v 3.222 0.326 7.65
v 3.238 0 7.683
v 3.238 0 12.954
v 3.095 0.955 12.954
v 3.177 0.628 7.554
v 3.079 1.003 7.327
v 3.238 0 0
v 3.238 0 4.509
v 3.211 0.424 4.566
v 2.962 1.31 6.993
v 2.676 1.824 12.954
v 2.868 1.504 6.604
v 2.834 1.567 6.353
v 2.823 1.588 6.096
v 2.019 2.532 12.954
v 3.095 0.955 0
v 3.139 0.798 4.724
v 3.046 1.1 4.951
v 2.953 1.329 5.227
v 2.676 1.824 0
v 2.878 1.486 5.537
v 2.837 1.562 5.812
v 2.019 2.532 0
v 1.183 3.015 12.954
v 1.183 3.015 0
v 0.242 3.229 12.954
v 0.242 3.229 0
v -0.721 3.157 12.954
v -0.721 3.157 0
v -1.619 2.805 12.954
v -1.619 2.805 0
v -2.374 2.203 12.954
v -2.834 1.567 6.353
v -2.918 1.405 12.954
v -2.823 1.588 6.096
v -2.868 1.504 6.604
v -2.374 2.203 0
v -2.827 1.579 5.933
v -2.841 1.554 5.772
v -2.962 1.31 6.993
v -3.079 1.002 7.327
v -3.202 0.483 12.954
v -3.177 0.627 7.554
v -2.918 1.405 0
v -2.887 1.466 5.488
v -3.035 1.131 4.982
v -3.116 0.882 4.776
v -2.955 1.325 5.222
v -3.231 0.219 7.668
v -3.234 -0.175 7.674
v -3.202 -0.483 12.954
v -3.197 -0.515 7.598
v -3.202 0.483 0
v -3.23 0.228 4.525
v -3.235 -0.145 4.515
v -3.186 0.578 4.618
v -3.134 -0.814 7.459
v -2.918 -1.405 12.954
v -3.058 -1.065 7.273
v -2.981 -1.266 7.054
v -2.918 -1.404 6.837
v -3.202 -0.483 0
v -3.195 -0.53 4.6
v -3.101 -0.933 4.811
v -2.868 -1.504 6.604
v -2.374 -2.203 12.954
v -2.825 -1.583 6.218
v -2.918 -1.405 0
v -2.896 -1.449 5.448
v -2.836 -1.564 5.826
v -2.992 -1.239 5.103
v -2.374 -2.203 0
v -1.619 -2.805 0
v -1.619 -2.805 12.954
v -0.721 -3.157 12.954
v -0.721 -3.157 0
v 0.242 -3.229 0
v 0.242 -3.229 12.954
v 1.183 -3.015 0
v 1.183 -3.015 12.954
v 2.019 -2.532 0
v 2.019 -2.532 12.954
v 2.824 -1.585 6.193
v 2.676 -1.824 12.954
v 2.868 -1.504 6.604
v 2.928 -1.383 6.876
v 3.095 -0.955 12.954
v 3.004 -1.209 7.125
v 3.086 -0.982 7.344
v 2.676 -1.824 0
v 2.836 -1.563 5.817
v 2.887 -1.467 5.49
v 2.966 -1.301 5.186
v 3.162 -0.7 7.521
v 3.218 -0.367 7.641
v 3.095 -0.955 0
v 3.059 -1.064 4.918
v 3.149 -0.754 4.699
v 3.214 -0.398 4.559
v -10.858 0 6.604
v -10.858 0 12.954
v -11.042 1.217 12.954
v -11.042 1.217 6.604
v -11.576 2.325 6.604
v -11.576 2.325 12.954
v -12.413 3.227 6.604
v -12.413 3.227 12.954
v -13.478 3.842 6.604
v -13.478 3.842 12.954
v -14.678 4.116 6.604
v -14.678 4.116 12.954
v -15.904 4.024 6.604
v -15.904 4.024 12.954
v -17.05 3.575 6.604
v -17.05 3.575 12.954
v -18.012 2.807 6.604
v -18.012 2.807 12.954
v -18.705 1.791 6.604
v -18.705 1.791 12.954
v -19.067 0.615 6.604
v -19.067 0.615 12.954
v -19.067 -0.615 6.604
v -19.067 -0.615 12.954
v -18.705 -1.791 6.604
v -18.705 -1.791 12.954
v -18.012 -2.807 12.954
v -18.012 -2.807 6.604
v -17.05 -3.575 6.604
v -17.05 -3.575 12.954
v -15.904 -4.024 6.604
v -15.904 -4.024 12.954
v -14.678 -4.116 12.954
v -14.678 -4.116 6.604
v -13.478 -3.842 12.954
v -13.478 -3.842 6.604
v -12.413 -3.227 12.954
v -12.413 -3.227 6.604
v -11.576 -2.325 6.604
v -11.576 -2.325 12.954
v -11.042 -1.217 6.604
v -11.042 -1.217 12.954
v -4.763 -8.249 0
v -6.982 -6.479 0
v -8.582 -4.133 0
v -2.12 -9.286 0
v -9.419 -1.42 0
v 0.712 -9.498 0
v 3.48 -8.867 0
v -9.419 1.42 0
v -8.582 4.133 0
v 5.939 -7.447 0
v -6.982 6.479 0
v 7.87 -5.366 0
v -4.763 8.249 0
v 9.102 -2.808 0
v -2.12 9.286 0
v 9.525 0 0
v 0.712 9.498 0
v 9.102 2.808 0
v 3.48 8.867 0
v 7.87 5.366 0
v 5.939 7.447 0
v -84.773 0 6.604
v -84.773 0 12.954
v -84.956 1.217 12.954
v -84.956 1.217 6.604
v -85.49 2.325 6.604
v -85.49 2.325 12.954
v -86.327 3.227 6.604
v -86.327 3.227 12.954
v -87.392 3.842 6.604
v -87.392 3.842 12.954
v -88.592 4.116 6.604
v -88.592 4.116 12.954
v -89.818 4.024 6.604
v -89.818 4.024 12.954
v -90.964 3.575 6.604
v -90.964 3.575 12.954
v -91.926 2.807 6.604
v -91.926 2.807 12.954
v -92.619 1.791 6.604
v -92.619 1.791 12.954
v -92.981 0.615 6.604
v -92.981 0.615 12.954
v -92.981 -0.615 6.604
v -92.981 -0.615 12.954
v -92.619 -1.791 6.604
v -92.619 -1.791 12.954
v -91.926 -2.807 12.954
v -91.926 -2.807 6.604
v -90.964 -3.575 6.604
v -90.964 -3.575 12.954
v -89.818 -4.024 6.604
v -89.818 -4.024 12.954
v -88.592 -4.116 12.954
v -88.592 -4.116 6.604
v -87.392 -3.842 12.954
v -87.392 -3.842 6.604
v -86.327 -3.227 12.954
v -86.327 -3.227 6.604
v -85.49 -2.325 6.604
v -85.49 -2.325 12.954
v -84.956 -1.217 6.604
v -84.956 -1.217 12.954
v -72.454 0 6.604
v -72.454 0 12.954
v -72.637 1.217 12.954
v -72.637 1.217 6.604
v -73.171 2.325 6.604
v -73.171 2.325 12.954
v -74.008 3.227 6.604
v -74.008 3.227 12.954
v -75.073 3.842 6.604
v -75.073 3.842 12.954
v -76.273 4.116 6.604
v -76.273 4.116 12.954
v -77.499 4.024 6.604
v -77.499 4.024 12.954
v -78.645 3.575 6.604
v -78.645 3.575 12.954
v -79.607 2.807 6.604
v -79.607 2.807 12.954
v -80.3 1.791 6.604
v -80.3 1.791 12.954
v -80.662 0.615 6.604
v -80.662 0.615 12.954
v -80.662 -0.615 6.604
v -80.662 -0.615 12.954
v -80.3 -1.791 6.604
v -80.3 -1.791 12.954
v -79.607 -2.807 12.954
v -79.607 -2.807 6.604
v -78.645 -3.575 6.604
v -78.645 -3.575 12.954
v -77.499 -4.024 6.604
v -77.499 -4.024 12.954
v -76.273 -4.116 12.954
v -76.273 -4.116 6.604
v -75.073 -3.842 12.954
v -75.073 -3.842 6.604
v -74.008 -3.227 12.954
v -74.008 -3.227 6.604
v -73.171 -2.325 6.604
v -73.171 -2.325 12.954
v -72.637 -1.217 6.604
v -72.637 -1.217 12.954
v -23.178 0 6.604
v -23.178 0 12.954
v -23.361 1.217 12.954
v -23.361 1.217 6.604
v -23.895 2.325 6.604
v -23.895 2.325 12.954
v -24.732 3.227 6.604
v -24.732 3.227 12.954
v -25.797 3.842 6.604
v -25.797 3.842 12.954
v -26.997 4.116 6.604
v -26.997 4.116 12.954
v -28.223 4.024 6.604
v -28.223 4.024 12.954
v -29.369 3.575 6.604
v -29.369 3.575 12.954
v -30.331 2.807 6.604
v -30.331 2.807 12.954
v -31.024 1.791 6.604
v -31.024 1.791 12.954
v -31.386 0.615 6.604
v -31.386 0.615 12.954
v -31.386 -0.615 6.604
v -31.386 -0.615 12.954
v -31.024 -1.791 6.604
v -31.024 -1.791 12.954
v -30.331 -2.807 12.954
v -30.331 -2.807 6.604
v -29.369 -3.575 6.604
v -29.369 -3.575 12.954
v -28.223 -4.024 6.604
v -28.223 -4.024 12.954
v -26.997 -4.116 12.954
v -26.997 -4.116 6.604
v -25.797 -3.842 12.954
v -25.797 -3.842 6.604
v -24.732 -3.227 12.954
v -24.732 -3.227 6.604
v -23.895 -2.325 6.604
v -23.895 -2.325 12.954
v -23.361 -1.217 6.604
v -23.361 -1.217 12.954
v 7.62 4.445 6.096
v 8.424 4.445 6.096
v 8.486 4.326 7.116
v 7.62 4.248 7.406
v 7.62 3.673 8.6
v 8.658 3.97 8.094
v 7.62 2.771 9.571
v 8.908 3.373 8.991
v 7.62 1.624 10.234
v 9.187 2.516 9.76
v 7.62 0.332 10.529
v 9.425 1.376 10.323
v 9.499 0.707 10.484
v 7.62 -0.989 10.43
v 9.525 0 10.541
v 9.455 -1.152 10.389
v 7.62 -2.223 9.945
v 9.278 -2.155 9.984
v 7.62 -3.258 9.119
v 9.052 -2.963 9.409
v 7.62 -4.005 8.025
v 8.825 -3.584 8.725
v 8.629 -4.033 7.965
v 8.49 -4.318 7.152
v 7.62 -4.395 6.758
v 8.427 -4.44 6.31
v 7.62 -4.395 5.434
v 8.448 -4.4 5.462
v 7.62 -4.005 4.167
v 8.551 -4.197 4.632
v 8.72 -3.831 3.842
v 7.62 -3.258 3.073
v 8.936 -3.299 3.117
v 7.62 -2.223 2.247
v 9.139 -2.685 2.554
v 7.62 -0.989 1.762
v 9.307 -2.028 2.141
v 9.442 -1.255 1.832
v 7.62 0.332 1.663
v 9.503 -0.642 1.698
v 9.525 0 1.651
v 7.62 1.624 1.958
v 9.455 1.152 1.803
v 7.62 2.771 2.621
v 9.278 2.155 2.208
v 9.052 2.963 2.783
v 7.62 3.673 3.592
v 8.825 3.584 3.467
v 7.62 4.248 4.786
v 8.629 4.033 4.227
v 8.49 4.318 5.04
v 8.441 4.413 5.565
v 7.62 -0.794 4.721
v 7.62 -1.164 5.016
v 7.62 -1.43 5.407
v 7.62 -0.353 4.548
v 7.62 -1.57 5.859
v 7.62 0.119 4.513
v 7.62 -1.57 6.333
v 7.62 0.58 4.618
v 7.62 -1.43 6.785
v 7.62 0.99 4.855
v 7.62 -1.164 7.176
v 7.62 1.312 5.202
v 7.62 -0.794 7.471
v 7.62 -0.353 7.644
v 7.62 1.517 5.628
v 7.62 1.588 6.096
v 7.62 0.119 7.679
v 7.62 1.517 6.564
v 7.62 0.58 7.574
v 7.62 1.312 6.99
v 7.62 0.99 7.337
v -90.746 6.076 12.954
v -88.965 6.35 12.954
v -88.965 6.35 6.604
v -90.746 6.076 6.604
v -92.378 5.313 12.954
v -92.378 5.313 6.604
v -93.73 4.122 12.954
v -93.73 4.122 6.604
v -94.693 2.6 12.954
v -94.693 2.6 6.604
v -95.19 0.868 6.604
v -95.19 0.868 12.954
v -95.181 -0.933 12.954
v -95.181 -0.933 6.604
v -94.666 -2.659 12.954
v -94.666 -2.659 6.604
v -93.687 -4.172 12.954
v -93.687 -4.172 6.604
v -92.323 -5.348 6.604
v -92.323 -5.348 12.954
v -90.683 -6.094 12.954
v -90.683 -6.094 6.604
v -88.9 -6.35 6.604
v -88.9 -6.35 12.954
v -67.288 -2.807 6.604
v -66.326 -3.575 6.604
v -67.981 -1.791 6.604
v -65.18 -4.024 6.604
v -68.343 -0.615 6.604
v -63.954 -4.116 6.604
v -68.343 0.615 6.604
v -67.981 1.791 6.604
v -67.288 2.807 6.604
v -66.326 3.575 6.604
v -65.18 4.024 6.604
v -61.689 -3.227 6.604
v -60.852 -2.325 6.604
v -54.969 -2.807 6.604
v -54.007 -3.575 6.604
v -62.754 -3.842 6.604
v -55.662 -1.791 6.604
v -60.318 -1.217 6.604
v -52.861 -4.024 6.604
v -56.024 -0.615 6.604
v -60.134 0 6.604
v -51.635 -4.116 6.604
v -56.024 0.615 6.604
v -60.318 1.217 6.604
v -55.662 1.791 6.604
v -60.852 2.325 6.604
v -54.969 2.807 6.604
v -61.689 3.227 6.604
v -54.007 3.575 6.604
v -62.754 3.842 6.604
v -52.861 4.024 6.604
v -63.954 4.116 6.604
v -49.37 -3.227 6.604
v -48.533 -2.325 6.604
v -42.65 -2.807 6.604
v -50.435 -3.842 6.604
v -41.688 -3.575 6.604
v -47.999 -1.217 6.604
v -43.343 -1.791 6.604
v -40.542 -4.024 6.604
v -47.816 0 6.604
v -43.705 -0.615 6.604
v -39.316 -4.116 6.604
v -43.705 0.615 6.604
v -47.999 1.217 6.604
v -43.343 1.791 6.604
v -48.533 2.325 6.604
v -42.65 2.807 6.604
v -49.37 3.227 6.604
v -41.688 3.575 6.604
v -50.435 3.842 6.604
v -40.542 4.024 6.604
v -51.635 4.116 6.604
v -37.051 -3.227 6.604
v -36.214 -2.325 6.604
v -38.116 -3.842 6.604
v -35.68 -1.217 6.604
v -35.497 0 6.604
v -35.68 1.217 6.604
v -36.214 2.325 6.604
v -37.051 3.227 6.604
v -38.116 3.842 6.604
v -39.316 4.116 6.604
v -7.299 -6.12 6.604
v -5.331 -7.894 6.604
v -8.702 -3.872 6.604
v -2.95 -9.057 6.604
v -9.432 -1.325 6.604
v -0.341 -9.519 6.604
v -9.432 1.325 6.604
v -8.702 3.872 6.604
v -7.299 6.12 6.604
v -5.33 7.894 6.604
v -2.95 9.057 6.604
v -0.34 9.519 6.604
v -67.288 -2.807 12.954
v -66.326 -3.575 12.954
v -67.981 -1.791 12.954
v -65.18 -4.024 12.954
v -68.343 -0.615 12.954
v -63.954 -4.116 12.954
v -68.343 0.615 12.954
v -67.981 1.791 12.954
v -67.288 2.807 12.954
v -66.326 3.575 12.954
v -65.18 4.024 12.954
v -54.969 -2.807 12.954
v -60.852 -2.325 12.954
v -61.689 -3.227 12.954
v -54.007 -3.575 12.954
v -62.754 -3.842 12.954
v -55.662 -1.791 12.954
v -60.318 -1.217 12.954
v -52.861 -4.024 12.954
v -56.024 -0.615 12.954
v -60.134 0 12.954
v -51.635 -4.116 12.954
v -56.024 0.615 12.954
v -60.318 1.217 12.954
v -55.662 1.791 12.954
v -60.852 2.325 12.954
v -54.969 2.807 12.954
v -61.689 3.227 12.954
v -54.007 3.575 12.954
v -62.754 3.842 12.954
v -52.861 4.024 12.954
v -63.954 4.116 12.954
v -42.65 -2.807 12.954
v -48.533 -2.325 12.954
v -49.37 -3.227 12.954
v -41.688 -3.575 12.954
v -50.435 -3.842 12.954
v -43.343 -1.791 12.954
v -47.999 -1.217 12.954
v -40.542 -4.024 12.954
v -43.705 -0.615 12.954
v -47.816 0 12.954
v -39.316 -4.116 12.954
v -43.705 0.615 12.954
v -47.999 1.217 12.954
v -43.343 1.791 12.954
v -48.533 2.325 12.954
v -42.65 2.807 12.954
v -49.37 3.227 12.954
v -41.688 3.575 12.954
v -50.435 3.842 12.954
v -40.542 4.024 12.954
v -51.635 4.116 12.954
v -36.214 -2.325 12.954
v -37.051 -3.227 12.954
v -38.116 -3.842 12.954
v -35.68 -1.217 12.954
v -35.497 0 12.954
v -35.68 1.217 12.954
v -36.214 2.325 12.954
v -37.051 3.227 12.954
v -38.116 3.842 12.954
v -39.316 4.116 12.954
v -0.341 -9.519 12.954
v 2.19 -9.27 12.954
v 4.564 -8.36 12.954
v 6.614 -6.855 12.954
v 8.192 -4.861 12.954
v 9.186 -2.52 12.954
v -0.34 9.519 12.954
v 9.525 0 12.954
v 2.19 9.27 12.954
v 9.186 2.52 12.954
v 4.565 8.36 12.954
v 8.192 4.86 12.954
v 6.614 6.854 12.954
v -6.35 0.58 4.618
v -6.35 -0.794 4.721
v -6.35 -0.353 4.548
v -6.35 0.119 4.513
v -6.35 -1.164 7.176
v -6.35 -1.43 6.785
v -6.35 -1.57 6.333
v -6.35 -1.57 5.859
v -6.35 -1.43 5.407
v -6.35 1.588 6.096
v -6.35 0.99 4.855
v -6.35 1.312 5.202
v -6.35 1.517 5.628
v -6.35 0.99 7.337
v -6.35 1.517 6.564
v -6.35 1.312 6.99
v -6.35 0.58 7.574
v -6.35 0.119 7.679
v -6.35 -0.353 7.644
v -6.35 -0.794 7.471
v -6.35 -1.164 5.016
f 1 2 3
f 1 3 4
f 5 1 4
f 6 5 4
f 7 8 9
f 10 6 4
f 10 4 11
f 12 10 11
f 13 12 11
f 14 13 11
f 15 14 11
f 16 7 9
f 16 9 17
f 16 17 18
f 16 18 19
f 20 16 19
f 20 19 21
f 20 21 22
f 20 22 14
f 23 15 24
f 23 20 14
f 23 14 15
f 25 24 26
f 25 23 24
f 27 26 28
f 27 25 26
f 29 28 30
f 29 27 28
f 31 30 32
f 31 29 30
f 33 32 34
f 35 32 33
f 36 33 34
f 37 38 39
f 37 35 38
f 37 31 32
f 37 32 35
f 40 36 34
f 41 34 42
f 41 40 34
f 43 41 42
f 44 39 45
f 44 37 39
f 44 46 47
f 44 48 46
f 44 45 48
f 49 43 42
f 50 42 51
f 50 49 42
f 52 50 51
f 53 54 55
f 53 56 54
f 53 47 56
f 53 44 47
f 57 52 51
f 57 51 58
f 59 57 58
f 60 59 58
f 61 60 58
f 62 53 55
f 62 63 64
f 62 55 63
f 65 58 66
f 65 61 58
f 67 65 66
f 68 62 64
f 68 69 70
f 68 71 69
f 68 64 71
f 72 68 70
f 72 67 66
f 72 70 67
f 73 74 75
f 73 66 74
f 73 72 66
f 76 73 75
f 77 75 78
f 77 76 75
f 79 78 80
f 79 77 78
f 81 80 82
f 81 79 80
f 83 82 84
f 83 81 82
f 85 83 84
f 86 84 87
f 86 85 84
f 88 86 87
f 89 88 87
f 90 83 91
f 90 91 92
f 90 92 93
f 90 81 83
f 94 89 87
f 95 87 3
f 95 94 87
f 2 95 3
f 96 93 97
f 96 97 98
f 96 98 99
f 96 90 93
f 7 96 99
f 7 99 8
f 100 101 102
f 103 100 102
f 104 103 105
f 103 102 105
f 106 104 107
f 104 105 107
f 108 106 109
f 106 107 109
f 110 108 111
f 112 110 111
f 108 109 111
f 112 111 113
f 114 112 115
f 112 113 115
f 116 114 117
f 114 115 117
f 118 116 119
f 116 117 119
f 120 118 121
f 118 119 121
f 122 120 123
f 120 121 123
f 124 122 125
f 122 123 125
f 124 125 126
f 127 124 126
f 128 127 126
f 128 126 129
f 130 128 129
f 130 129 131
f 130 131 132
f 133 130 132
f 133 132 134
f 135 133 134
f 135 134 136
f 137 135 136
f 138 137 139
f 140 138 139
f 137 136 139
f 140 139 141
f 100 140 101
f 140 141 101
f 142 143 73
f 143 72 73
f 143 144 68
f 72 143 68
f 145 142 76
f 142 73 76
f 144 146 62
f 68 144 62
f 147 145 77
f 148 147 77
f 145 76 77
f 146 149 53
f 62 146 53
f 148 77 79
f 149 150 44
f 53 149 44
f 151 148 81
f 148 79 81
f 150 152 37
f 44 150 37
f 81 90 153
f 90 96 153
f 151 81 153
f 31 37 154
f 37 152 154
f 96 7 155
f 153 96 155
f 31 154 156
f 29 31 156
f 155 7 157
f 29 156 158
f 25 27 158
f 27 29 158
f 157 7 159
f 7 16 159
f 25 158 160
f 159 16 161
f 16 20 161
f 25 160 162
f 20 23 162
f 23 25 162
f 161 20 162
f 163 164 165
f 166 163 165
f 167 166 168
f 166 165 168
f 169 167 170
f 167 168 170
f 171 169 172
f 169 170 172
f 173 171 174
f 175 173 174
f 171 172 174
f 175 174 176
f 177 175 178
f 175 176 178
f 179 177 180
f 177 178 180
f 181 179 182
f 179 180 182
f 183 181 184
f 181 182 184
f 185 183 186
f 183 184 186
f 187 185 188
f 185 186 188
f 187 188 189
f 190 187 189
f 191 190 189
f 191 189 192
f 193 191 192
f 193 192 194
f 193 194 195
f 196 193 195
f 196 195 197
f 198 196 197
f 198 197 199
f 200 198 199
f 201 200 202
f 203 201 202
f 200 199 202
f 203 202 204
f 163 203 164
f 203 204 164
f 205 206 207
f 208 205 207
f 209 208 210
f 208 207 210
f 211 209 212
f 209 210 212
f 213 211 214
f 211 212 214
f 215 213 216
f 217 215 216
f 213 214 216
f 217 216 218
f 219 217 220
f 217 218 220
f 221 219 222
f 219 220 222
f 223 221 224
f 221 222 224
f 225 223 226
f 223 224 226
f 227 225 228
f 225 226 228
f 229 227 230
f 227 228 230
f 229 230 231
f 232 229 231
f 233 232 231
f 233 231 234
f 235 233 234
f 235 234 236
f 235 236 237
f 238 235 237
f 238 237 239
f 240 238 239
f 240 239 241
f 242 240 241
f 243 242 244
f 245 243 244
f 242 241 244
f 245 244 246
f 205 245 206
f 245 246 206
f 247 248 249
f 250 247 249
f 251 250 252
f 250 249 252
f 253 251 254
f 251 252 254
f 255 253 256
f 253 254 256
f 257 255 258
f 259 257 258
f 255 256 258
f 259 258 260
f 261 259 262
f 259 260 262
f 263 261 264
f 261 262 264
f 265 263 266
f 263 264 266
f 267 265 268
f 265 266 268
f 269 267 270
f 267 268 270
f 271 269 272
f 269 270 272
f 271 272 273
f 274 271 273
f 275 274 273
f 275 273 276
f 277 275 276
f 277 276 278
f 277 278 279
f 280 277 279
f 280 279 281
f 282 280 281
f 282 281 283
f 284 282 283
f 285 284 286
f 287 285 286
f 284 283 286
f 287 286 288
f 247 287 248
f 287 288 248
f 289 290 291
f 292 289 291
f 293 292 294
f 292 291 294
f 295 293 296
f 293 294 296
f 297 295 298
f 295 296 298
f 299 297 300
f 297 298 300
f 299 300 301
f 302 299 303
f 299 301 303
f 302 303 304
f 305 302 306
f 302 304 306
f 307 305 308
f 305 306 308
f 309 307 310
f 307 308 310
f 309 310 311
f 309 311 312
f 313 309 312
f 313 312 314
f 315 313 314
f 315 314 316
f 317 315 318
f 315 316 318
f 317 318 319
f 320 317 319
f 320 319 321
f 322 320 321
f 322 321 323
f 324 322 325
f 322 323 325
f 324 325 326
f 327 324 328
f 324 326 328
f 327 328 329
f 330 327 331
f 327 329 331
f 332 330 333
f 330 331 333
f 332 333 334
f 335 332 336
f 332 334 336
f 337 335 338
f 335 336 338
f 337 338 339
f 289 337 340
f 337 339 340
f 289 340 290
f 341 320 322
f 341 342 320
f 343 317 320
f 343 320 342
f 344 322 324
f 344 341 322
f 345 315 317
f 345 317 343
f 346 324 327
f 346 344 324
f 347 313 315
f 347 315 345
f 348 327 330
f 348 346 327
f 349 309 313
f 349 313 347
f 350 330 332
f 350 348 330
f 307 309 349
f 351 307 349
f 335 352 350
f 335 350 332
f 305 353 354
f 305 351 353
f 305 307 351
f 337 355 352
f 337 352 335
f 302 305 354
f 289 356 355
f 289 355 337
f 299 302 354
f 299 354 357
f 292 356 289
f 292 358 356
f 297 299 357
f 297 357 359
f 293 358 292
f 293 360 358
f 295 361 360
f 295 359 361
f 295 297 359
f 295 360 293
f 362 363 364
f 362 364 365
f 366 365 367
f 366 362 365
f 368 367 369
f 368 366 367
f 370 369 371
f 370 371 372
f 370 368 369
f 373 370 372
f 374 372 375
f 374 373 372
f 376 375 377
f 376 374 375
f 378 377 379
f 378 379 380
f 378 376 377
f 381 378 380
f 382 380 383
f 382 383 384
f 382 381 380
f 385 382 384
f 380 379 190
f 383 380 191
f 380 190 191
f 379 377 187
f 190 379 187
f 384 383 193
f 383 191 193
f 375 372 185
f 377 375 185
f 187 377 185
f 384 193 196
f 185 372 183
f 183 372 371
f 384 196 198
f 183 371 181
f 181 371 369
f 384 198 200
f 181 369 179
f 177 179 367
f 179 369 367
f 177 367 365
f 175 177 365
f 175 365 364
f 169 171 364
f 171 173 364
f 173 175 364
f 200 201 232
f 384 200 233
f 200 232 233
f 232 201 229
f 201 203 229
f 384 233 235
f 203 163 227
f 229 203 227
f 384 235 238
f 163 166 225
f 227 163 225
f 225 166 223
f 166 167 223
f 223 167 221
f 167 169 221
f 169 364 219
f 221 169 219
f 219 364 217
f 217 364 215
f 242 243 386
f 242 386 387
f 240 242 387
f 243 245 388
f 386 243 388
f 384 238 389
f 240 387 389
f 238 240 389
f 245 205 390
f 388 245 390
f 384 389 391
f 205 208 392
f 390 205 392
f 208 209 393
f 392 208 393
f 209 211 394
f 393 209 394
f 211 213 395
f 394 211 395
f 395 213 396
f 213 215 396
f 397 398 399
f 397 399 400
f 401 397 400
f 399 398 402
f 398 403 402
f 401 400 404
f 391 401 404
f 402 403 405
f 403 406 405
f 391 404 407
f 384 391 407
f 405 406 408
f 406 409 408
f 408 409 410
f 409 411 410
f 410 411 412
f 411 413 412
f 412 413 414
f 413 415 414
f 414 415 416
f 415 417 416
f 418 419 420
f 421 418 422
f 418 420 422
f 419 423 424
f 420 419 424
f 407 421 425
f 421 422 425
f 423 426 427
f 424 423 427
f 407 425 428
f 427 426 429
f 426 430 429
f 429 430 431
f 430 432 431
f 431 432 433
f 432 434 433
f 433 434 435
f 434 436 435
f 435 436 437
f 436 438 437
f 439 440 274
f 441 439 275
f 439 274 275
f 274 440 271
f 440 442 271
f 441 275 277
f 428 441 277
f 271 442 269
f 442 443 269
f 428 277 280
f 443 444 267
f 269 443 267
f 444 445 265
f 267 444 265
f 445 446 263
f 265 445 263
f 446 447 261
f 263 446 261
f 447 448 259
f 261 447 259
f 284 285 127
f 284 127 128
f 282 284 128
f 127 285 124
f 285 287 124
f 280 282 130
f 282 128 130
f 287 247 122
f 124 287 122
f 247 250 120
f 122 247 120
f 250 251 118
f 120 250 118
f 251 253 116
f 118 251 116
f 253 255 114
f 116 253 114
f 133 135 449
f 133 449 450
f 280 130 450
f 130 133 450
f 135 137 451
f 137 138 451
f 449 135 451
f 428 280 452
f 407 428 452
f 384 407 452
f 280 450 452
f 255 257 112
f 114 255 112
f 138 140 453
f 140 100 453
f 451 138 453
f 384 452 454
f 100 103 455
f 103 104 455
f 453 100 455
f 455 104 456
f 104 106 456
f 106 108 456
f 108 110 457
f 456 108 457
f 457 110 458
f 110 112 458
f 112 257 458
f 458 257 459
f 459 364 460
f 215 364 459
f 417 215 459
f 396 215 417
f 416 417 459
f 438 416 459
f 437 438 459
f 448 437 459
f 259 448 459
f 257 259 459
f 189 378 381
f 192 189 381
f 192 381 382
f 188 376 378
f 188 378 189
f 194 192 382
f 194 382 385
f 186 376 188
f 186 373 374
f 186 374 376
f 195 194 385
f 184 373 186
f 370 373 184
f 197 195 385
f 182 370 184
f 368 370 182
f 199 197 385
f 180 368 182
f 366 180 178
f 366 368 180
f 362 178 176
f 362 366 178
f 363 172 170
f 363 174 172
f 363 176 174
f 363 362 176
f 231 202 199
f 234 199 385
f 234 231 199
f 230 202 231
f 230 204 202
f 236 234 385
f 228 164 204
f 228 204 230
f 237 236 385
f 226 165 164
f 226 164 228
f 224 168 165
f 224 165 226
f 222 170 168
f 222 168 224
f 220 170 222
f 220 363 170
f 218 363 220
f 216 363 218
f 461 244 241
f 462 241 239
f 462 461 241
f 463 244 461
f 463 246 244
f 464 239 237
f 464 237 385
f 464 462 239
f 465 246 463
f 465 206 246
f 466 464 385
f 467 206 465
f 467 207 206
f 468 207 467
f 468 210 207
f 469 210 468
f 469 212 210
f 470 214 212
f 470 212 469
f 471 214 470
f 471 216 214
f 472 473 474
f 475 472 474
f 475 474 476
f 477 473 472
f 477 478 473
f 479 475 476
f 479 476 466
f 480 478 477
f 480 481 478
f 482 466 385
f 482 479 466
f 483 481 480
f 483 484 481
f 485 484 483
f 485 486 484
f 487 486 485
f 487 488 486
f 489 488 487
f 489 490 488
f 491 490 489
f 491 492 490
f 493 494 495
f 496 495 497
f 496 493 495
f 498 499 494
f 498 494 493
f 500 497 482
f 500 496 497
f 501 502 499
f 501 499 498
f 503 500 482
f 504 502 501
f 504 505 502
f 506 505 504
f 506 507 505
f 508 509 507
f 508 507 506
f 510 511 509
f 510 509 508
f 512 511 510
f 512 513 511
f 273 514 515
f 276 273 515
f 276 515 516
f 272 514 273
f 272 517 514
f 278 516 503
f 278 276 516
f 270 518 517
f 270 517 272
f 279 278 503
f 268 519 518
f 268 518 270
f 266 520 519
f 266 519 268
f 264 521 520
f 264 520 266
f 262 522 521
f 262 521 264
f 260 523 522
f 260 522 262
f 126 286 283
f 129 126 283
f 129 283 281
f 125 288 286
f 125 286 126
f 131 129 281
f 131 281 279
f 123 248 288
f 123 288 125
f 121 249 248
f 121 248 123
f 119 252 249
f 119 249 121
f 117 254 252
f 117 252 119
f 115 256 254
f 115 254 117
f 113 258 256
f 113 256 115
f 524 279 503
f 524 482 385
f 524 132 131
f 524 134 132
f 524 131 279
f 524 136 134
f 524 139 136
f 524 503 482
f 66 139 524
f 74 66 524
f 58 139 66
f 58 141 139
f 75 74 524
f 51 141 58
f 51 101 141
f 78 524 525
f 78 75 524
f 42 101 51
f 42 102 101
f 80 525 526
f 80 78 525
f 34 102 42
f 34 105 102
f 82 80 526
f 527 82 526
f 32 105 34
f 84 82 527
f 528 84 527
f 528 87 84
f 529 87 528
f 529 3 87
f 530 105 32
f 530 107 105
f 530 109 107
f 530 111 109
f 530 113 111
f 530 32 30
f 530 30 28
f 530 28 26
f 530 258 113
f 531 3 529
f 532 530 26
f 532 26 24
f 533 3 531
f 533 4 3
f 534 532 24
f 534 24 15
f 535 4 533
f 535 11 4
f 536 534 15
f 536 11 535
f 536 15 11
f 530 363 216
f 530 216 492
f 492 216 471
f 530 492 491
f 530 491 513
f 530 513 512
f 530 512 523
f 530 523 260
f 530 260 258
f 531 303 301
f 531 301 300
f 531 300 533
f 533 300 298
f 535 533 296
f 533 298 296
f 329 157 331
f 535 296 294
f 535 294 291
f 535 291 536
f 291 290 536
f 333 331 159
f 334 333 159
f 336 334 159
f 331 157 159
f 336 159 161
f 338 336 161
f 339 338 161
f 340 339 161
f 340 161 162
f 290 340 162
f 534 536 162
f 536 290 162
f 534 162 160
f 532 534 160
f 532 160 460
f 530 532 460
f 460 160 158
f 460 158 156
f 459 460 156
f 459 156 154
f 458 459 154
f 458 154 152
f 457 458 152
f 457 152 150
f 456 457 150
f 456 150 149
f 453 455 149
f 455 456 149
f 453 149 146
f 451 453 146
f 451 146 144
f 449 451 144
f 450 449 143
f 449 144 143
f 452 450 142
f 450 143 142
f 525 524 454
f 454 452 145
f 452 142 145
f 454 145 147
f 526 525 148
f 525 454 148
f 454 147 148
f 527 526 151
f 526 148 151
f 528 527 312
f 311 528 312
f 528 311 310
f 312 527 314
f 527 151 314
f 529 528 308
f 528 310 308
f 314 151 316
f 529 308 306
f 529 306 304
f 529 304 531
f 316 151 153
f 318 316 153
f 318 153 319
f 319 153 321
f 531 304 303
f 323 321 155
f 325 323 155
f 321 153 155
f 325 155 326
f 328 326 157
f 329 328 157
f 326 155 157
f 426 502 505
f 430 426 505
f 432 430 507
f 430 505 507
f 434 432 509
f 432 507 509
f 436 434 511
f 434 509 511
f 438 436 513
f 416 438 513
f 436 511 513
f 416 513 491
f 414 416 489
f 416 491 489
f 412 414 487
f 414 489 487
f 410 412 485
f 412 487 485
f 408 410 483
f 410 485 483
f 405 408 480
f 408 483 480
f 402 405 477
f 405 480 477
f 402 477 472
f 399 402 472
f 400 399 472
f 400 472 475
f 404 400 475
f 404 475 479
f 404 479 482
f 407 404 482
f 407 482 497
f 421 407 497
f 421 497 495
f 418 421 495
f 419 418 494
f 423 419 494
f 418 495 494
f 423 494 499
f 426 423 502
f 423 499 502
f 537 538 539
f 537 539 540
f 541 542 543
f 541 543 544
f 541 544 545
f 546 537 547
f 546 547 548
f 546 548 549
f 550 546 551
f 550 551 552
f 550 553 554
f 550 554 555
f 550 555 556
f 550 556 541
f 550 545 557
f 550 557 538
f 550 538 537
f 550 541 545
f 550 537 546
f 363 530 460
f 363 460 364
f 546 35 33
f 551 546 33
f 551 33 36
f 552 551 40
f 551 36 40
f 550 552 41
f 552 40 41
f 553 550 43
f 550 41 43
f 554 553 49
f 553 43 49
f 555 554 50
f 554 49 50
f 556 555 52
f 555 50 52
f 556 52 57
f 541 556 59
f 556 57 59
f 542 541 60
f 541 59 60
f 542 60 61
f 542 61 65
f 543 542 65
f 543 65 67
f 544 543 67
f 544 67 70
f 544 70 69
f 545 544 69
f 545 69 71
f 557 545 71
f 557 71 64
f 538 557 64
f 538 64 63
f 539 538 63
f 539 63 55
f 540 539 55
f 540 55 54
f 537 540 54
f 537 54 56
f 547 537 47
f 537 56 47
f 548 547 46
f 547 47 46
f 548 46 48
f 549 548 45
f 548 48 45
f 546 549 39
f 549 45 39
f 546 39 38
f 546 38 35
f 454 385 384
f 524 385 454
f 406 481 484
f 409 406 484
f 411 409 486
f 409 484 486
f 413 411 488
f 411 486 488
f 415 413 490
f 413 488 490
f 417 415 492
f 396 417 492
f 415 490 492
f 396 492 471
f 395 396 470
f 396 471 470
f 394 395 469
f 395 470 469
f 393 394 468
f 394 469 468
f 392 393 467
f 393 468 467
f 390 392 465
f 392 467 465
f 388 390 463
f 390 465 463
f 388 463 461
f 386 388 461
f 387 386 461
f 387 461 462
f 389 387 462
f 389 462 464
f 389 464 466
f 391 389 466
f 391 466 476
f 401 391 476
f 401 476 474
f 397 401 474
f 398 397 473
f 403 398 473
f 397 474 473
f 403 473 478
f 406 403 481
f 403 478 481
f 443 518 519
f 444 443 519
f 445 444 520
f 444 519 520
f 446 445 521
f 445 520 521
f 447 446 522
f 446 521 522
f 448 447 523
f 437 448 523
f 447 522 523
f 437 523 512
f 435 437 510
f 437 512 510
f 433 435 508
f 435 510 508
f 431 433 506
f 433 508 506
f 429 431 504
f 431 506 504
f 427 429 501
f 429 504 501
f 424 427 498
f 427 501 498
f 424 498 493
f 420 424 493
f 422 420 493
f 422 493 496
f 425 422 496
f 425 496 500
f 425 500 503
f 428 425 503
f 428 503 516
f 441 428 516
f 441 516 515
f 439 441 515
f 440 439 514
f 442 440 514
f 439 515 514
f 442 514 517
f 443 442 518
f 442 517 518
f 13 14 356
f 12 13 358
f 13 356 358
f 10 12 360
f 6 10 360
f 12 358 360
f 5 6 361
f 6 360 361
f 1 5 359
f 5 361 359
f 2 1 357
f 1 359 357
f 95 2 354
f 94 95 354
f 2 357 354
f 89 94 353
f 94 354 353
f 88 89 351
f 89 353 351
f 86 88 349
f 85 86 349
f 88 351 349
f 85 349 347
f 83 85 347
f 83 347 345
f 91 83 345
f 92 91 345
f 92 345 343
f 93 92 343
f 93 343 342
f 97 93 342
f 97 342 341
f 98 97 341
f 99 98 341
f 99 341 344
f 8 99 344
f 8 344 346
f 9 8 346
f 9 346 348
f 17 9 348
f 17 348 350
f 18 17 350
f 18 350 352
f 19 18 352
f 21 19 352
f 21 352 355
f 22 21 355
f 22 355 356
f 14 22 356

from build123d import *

# Parameters (mm, degrees)
F0_R     = 9.525
F0_R_2   = 3.2385
F1_DEPTH = 12.954
F2_R     = 4.1275
F3_DEPTH = 6.35
F5_R     = 1.5875
F6_DEPTH = 31.75
F7_DEPTH = 25.4
F5_R_2   = 4.445
F8_DEPTH = 17.78


with BuildPart() as f1:
    # F0 (on Top) → F1 (new body)
    with BuildSketch(Plane.XY):
        Circle(F0_R)
        Circle(F0_R_2, mode=Mode.SUBTRACT)
    extrude(amount=F1_DEPTH)

    # F2 (on face) → F3 (join)
    with BuildSketch(Plane.XY.offset(12.954)):
        with BuildLine():
            ThreePointArc((-0.3406139649, -9.5189078747), (6.6136705763, -6.8545595415), (9.525, 0))
            ThreePointArc((9.525, 0), (6.6137479521, 6.8544848841), (-0.3403990606, 9.5189155622))
            ThreePointArc((-0.3403990606, 9.5189155622), (-9.5249999994, 0.0001075209), (-0.3406139649, -9.5189078747))
        make_face()
        with BuildLine():
            ThreePointArc((-0.3406139649, -9.5189078747), (-9.5249999994, 0.0001075209), (-0.3403990606, 9.5189155622))
            Line((-0.3403990606, 9.5189155622), (-88.965388203, 6.3496633283))
            ThreePointArc((-88.965388203, 6.3496633283), (-84.4330499829, 4.5131870717), (-82.55, 0))
            ThreePointArc((-82.55, 0), (-84.4098719395, -4.4901280605), (-88.9, -6.35))
            Line((-88.9, -6.35), (-0.3406139649, -9.5189078747))
        make_face()
        with Locations((-76.581, 0)):
            Circle(F2_R, mode=Mode.SUBTRACT)
        with Locations((-64.262, 0)):
            Circle(F2_R, mode=Mode.SUBTRACT)
        with Locations((-51.943, 0)):
            Circle(F2_R, mode=Mode.SUBTRACT)
        with Locations((-39.624, 0)):
            Circle(F2_R, mode=Mode.SUBTRACT)
        with Locations((-27.305, 0)):
            Circle(F2_R, mode=Mode.SUBTRACT)
        with Locations((-14.986, 0)):
            Circle(F2_R, mode=Mode.SUBTRACT)
        with BuildLine():
            ThreePointArc((-82.55, 0), (-84.4330499829, 4.5131870717), (-88.965388203, 6.3496633283))
            ThreePointArc((-88.965388203, 6.3496633283), (-95.2499158315, -0.0326945349), (-88.9, -6.35))
            ThreePointArc((-88.9, -6.35), (-84.4098719395, -4.4901280605), (-82.55, 0))
        make_face()
        with Locations((-88.9, 0)):
            Circle(F2_R, mode=Mode.SUBTRACT)
    extrude(amount=-F3_DEPTH)

    # F5 (on offset) → F6 (cut)
    with BuildSketch(Plane.YZ.offset(25.4)):
        with Locations((0, 6.096)):
            Circle(F5_R)
    extrude(amount=-F6_DEPTH, mode=Mode.SUBTRACT)

    # F0 (on Top) → F7 (cut)
    with BuildSketch(Plane.XY):
        Circle(F0_R_2)
    extrude(amount=F7_DEPTH, mode=Mode.SUBTRACT)

    # F5 (on offset) → F8 (cut)
    with BuildSketch(Plane.YZ.offset(25.4)):
        with Locations((0, 6.096)):
            Circle(F5_R_2)
        with Locations((0, 6.096)):
            Circle(F5_R, mode=Mode.SUBTRACT)
    extrude(amount=-F8_DEPTH, mode=Mode.SUBTRACT)


solid = f1.part
